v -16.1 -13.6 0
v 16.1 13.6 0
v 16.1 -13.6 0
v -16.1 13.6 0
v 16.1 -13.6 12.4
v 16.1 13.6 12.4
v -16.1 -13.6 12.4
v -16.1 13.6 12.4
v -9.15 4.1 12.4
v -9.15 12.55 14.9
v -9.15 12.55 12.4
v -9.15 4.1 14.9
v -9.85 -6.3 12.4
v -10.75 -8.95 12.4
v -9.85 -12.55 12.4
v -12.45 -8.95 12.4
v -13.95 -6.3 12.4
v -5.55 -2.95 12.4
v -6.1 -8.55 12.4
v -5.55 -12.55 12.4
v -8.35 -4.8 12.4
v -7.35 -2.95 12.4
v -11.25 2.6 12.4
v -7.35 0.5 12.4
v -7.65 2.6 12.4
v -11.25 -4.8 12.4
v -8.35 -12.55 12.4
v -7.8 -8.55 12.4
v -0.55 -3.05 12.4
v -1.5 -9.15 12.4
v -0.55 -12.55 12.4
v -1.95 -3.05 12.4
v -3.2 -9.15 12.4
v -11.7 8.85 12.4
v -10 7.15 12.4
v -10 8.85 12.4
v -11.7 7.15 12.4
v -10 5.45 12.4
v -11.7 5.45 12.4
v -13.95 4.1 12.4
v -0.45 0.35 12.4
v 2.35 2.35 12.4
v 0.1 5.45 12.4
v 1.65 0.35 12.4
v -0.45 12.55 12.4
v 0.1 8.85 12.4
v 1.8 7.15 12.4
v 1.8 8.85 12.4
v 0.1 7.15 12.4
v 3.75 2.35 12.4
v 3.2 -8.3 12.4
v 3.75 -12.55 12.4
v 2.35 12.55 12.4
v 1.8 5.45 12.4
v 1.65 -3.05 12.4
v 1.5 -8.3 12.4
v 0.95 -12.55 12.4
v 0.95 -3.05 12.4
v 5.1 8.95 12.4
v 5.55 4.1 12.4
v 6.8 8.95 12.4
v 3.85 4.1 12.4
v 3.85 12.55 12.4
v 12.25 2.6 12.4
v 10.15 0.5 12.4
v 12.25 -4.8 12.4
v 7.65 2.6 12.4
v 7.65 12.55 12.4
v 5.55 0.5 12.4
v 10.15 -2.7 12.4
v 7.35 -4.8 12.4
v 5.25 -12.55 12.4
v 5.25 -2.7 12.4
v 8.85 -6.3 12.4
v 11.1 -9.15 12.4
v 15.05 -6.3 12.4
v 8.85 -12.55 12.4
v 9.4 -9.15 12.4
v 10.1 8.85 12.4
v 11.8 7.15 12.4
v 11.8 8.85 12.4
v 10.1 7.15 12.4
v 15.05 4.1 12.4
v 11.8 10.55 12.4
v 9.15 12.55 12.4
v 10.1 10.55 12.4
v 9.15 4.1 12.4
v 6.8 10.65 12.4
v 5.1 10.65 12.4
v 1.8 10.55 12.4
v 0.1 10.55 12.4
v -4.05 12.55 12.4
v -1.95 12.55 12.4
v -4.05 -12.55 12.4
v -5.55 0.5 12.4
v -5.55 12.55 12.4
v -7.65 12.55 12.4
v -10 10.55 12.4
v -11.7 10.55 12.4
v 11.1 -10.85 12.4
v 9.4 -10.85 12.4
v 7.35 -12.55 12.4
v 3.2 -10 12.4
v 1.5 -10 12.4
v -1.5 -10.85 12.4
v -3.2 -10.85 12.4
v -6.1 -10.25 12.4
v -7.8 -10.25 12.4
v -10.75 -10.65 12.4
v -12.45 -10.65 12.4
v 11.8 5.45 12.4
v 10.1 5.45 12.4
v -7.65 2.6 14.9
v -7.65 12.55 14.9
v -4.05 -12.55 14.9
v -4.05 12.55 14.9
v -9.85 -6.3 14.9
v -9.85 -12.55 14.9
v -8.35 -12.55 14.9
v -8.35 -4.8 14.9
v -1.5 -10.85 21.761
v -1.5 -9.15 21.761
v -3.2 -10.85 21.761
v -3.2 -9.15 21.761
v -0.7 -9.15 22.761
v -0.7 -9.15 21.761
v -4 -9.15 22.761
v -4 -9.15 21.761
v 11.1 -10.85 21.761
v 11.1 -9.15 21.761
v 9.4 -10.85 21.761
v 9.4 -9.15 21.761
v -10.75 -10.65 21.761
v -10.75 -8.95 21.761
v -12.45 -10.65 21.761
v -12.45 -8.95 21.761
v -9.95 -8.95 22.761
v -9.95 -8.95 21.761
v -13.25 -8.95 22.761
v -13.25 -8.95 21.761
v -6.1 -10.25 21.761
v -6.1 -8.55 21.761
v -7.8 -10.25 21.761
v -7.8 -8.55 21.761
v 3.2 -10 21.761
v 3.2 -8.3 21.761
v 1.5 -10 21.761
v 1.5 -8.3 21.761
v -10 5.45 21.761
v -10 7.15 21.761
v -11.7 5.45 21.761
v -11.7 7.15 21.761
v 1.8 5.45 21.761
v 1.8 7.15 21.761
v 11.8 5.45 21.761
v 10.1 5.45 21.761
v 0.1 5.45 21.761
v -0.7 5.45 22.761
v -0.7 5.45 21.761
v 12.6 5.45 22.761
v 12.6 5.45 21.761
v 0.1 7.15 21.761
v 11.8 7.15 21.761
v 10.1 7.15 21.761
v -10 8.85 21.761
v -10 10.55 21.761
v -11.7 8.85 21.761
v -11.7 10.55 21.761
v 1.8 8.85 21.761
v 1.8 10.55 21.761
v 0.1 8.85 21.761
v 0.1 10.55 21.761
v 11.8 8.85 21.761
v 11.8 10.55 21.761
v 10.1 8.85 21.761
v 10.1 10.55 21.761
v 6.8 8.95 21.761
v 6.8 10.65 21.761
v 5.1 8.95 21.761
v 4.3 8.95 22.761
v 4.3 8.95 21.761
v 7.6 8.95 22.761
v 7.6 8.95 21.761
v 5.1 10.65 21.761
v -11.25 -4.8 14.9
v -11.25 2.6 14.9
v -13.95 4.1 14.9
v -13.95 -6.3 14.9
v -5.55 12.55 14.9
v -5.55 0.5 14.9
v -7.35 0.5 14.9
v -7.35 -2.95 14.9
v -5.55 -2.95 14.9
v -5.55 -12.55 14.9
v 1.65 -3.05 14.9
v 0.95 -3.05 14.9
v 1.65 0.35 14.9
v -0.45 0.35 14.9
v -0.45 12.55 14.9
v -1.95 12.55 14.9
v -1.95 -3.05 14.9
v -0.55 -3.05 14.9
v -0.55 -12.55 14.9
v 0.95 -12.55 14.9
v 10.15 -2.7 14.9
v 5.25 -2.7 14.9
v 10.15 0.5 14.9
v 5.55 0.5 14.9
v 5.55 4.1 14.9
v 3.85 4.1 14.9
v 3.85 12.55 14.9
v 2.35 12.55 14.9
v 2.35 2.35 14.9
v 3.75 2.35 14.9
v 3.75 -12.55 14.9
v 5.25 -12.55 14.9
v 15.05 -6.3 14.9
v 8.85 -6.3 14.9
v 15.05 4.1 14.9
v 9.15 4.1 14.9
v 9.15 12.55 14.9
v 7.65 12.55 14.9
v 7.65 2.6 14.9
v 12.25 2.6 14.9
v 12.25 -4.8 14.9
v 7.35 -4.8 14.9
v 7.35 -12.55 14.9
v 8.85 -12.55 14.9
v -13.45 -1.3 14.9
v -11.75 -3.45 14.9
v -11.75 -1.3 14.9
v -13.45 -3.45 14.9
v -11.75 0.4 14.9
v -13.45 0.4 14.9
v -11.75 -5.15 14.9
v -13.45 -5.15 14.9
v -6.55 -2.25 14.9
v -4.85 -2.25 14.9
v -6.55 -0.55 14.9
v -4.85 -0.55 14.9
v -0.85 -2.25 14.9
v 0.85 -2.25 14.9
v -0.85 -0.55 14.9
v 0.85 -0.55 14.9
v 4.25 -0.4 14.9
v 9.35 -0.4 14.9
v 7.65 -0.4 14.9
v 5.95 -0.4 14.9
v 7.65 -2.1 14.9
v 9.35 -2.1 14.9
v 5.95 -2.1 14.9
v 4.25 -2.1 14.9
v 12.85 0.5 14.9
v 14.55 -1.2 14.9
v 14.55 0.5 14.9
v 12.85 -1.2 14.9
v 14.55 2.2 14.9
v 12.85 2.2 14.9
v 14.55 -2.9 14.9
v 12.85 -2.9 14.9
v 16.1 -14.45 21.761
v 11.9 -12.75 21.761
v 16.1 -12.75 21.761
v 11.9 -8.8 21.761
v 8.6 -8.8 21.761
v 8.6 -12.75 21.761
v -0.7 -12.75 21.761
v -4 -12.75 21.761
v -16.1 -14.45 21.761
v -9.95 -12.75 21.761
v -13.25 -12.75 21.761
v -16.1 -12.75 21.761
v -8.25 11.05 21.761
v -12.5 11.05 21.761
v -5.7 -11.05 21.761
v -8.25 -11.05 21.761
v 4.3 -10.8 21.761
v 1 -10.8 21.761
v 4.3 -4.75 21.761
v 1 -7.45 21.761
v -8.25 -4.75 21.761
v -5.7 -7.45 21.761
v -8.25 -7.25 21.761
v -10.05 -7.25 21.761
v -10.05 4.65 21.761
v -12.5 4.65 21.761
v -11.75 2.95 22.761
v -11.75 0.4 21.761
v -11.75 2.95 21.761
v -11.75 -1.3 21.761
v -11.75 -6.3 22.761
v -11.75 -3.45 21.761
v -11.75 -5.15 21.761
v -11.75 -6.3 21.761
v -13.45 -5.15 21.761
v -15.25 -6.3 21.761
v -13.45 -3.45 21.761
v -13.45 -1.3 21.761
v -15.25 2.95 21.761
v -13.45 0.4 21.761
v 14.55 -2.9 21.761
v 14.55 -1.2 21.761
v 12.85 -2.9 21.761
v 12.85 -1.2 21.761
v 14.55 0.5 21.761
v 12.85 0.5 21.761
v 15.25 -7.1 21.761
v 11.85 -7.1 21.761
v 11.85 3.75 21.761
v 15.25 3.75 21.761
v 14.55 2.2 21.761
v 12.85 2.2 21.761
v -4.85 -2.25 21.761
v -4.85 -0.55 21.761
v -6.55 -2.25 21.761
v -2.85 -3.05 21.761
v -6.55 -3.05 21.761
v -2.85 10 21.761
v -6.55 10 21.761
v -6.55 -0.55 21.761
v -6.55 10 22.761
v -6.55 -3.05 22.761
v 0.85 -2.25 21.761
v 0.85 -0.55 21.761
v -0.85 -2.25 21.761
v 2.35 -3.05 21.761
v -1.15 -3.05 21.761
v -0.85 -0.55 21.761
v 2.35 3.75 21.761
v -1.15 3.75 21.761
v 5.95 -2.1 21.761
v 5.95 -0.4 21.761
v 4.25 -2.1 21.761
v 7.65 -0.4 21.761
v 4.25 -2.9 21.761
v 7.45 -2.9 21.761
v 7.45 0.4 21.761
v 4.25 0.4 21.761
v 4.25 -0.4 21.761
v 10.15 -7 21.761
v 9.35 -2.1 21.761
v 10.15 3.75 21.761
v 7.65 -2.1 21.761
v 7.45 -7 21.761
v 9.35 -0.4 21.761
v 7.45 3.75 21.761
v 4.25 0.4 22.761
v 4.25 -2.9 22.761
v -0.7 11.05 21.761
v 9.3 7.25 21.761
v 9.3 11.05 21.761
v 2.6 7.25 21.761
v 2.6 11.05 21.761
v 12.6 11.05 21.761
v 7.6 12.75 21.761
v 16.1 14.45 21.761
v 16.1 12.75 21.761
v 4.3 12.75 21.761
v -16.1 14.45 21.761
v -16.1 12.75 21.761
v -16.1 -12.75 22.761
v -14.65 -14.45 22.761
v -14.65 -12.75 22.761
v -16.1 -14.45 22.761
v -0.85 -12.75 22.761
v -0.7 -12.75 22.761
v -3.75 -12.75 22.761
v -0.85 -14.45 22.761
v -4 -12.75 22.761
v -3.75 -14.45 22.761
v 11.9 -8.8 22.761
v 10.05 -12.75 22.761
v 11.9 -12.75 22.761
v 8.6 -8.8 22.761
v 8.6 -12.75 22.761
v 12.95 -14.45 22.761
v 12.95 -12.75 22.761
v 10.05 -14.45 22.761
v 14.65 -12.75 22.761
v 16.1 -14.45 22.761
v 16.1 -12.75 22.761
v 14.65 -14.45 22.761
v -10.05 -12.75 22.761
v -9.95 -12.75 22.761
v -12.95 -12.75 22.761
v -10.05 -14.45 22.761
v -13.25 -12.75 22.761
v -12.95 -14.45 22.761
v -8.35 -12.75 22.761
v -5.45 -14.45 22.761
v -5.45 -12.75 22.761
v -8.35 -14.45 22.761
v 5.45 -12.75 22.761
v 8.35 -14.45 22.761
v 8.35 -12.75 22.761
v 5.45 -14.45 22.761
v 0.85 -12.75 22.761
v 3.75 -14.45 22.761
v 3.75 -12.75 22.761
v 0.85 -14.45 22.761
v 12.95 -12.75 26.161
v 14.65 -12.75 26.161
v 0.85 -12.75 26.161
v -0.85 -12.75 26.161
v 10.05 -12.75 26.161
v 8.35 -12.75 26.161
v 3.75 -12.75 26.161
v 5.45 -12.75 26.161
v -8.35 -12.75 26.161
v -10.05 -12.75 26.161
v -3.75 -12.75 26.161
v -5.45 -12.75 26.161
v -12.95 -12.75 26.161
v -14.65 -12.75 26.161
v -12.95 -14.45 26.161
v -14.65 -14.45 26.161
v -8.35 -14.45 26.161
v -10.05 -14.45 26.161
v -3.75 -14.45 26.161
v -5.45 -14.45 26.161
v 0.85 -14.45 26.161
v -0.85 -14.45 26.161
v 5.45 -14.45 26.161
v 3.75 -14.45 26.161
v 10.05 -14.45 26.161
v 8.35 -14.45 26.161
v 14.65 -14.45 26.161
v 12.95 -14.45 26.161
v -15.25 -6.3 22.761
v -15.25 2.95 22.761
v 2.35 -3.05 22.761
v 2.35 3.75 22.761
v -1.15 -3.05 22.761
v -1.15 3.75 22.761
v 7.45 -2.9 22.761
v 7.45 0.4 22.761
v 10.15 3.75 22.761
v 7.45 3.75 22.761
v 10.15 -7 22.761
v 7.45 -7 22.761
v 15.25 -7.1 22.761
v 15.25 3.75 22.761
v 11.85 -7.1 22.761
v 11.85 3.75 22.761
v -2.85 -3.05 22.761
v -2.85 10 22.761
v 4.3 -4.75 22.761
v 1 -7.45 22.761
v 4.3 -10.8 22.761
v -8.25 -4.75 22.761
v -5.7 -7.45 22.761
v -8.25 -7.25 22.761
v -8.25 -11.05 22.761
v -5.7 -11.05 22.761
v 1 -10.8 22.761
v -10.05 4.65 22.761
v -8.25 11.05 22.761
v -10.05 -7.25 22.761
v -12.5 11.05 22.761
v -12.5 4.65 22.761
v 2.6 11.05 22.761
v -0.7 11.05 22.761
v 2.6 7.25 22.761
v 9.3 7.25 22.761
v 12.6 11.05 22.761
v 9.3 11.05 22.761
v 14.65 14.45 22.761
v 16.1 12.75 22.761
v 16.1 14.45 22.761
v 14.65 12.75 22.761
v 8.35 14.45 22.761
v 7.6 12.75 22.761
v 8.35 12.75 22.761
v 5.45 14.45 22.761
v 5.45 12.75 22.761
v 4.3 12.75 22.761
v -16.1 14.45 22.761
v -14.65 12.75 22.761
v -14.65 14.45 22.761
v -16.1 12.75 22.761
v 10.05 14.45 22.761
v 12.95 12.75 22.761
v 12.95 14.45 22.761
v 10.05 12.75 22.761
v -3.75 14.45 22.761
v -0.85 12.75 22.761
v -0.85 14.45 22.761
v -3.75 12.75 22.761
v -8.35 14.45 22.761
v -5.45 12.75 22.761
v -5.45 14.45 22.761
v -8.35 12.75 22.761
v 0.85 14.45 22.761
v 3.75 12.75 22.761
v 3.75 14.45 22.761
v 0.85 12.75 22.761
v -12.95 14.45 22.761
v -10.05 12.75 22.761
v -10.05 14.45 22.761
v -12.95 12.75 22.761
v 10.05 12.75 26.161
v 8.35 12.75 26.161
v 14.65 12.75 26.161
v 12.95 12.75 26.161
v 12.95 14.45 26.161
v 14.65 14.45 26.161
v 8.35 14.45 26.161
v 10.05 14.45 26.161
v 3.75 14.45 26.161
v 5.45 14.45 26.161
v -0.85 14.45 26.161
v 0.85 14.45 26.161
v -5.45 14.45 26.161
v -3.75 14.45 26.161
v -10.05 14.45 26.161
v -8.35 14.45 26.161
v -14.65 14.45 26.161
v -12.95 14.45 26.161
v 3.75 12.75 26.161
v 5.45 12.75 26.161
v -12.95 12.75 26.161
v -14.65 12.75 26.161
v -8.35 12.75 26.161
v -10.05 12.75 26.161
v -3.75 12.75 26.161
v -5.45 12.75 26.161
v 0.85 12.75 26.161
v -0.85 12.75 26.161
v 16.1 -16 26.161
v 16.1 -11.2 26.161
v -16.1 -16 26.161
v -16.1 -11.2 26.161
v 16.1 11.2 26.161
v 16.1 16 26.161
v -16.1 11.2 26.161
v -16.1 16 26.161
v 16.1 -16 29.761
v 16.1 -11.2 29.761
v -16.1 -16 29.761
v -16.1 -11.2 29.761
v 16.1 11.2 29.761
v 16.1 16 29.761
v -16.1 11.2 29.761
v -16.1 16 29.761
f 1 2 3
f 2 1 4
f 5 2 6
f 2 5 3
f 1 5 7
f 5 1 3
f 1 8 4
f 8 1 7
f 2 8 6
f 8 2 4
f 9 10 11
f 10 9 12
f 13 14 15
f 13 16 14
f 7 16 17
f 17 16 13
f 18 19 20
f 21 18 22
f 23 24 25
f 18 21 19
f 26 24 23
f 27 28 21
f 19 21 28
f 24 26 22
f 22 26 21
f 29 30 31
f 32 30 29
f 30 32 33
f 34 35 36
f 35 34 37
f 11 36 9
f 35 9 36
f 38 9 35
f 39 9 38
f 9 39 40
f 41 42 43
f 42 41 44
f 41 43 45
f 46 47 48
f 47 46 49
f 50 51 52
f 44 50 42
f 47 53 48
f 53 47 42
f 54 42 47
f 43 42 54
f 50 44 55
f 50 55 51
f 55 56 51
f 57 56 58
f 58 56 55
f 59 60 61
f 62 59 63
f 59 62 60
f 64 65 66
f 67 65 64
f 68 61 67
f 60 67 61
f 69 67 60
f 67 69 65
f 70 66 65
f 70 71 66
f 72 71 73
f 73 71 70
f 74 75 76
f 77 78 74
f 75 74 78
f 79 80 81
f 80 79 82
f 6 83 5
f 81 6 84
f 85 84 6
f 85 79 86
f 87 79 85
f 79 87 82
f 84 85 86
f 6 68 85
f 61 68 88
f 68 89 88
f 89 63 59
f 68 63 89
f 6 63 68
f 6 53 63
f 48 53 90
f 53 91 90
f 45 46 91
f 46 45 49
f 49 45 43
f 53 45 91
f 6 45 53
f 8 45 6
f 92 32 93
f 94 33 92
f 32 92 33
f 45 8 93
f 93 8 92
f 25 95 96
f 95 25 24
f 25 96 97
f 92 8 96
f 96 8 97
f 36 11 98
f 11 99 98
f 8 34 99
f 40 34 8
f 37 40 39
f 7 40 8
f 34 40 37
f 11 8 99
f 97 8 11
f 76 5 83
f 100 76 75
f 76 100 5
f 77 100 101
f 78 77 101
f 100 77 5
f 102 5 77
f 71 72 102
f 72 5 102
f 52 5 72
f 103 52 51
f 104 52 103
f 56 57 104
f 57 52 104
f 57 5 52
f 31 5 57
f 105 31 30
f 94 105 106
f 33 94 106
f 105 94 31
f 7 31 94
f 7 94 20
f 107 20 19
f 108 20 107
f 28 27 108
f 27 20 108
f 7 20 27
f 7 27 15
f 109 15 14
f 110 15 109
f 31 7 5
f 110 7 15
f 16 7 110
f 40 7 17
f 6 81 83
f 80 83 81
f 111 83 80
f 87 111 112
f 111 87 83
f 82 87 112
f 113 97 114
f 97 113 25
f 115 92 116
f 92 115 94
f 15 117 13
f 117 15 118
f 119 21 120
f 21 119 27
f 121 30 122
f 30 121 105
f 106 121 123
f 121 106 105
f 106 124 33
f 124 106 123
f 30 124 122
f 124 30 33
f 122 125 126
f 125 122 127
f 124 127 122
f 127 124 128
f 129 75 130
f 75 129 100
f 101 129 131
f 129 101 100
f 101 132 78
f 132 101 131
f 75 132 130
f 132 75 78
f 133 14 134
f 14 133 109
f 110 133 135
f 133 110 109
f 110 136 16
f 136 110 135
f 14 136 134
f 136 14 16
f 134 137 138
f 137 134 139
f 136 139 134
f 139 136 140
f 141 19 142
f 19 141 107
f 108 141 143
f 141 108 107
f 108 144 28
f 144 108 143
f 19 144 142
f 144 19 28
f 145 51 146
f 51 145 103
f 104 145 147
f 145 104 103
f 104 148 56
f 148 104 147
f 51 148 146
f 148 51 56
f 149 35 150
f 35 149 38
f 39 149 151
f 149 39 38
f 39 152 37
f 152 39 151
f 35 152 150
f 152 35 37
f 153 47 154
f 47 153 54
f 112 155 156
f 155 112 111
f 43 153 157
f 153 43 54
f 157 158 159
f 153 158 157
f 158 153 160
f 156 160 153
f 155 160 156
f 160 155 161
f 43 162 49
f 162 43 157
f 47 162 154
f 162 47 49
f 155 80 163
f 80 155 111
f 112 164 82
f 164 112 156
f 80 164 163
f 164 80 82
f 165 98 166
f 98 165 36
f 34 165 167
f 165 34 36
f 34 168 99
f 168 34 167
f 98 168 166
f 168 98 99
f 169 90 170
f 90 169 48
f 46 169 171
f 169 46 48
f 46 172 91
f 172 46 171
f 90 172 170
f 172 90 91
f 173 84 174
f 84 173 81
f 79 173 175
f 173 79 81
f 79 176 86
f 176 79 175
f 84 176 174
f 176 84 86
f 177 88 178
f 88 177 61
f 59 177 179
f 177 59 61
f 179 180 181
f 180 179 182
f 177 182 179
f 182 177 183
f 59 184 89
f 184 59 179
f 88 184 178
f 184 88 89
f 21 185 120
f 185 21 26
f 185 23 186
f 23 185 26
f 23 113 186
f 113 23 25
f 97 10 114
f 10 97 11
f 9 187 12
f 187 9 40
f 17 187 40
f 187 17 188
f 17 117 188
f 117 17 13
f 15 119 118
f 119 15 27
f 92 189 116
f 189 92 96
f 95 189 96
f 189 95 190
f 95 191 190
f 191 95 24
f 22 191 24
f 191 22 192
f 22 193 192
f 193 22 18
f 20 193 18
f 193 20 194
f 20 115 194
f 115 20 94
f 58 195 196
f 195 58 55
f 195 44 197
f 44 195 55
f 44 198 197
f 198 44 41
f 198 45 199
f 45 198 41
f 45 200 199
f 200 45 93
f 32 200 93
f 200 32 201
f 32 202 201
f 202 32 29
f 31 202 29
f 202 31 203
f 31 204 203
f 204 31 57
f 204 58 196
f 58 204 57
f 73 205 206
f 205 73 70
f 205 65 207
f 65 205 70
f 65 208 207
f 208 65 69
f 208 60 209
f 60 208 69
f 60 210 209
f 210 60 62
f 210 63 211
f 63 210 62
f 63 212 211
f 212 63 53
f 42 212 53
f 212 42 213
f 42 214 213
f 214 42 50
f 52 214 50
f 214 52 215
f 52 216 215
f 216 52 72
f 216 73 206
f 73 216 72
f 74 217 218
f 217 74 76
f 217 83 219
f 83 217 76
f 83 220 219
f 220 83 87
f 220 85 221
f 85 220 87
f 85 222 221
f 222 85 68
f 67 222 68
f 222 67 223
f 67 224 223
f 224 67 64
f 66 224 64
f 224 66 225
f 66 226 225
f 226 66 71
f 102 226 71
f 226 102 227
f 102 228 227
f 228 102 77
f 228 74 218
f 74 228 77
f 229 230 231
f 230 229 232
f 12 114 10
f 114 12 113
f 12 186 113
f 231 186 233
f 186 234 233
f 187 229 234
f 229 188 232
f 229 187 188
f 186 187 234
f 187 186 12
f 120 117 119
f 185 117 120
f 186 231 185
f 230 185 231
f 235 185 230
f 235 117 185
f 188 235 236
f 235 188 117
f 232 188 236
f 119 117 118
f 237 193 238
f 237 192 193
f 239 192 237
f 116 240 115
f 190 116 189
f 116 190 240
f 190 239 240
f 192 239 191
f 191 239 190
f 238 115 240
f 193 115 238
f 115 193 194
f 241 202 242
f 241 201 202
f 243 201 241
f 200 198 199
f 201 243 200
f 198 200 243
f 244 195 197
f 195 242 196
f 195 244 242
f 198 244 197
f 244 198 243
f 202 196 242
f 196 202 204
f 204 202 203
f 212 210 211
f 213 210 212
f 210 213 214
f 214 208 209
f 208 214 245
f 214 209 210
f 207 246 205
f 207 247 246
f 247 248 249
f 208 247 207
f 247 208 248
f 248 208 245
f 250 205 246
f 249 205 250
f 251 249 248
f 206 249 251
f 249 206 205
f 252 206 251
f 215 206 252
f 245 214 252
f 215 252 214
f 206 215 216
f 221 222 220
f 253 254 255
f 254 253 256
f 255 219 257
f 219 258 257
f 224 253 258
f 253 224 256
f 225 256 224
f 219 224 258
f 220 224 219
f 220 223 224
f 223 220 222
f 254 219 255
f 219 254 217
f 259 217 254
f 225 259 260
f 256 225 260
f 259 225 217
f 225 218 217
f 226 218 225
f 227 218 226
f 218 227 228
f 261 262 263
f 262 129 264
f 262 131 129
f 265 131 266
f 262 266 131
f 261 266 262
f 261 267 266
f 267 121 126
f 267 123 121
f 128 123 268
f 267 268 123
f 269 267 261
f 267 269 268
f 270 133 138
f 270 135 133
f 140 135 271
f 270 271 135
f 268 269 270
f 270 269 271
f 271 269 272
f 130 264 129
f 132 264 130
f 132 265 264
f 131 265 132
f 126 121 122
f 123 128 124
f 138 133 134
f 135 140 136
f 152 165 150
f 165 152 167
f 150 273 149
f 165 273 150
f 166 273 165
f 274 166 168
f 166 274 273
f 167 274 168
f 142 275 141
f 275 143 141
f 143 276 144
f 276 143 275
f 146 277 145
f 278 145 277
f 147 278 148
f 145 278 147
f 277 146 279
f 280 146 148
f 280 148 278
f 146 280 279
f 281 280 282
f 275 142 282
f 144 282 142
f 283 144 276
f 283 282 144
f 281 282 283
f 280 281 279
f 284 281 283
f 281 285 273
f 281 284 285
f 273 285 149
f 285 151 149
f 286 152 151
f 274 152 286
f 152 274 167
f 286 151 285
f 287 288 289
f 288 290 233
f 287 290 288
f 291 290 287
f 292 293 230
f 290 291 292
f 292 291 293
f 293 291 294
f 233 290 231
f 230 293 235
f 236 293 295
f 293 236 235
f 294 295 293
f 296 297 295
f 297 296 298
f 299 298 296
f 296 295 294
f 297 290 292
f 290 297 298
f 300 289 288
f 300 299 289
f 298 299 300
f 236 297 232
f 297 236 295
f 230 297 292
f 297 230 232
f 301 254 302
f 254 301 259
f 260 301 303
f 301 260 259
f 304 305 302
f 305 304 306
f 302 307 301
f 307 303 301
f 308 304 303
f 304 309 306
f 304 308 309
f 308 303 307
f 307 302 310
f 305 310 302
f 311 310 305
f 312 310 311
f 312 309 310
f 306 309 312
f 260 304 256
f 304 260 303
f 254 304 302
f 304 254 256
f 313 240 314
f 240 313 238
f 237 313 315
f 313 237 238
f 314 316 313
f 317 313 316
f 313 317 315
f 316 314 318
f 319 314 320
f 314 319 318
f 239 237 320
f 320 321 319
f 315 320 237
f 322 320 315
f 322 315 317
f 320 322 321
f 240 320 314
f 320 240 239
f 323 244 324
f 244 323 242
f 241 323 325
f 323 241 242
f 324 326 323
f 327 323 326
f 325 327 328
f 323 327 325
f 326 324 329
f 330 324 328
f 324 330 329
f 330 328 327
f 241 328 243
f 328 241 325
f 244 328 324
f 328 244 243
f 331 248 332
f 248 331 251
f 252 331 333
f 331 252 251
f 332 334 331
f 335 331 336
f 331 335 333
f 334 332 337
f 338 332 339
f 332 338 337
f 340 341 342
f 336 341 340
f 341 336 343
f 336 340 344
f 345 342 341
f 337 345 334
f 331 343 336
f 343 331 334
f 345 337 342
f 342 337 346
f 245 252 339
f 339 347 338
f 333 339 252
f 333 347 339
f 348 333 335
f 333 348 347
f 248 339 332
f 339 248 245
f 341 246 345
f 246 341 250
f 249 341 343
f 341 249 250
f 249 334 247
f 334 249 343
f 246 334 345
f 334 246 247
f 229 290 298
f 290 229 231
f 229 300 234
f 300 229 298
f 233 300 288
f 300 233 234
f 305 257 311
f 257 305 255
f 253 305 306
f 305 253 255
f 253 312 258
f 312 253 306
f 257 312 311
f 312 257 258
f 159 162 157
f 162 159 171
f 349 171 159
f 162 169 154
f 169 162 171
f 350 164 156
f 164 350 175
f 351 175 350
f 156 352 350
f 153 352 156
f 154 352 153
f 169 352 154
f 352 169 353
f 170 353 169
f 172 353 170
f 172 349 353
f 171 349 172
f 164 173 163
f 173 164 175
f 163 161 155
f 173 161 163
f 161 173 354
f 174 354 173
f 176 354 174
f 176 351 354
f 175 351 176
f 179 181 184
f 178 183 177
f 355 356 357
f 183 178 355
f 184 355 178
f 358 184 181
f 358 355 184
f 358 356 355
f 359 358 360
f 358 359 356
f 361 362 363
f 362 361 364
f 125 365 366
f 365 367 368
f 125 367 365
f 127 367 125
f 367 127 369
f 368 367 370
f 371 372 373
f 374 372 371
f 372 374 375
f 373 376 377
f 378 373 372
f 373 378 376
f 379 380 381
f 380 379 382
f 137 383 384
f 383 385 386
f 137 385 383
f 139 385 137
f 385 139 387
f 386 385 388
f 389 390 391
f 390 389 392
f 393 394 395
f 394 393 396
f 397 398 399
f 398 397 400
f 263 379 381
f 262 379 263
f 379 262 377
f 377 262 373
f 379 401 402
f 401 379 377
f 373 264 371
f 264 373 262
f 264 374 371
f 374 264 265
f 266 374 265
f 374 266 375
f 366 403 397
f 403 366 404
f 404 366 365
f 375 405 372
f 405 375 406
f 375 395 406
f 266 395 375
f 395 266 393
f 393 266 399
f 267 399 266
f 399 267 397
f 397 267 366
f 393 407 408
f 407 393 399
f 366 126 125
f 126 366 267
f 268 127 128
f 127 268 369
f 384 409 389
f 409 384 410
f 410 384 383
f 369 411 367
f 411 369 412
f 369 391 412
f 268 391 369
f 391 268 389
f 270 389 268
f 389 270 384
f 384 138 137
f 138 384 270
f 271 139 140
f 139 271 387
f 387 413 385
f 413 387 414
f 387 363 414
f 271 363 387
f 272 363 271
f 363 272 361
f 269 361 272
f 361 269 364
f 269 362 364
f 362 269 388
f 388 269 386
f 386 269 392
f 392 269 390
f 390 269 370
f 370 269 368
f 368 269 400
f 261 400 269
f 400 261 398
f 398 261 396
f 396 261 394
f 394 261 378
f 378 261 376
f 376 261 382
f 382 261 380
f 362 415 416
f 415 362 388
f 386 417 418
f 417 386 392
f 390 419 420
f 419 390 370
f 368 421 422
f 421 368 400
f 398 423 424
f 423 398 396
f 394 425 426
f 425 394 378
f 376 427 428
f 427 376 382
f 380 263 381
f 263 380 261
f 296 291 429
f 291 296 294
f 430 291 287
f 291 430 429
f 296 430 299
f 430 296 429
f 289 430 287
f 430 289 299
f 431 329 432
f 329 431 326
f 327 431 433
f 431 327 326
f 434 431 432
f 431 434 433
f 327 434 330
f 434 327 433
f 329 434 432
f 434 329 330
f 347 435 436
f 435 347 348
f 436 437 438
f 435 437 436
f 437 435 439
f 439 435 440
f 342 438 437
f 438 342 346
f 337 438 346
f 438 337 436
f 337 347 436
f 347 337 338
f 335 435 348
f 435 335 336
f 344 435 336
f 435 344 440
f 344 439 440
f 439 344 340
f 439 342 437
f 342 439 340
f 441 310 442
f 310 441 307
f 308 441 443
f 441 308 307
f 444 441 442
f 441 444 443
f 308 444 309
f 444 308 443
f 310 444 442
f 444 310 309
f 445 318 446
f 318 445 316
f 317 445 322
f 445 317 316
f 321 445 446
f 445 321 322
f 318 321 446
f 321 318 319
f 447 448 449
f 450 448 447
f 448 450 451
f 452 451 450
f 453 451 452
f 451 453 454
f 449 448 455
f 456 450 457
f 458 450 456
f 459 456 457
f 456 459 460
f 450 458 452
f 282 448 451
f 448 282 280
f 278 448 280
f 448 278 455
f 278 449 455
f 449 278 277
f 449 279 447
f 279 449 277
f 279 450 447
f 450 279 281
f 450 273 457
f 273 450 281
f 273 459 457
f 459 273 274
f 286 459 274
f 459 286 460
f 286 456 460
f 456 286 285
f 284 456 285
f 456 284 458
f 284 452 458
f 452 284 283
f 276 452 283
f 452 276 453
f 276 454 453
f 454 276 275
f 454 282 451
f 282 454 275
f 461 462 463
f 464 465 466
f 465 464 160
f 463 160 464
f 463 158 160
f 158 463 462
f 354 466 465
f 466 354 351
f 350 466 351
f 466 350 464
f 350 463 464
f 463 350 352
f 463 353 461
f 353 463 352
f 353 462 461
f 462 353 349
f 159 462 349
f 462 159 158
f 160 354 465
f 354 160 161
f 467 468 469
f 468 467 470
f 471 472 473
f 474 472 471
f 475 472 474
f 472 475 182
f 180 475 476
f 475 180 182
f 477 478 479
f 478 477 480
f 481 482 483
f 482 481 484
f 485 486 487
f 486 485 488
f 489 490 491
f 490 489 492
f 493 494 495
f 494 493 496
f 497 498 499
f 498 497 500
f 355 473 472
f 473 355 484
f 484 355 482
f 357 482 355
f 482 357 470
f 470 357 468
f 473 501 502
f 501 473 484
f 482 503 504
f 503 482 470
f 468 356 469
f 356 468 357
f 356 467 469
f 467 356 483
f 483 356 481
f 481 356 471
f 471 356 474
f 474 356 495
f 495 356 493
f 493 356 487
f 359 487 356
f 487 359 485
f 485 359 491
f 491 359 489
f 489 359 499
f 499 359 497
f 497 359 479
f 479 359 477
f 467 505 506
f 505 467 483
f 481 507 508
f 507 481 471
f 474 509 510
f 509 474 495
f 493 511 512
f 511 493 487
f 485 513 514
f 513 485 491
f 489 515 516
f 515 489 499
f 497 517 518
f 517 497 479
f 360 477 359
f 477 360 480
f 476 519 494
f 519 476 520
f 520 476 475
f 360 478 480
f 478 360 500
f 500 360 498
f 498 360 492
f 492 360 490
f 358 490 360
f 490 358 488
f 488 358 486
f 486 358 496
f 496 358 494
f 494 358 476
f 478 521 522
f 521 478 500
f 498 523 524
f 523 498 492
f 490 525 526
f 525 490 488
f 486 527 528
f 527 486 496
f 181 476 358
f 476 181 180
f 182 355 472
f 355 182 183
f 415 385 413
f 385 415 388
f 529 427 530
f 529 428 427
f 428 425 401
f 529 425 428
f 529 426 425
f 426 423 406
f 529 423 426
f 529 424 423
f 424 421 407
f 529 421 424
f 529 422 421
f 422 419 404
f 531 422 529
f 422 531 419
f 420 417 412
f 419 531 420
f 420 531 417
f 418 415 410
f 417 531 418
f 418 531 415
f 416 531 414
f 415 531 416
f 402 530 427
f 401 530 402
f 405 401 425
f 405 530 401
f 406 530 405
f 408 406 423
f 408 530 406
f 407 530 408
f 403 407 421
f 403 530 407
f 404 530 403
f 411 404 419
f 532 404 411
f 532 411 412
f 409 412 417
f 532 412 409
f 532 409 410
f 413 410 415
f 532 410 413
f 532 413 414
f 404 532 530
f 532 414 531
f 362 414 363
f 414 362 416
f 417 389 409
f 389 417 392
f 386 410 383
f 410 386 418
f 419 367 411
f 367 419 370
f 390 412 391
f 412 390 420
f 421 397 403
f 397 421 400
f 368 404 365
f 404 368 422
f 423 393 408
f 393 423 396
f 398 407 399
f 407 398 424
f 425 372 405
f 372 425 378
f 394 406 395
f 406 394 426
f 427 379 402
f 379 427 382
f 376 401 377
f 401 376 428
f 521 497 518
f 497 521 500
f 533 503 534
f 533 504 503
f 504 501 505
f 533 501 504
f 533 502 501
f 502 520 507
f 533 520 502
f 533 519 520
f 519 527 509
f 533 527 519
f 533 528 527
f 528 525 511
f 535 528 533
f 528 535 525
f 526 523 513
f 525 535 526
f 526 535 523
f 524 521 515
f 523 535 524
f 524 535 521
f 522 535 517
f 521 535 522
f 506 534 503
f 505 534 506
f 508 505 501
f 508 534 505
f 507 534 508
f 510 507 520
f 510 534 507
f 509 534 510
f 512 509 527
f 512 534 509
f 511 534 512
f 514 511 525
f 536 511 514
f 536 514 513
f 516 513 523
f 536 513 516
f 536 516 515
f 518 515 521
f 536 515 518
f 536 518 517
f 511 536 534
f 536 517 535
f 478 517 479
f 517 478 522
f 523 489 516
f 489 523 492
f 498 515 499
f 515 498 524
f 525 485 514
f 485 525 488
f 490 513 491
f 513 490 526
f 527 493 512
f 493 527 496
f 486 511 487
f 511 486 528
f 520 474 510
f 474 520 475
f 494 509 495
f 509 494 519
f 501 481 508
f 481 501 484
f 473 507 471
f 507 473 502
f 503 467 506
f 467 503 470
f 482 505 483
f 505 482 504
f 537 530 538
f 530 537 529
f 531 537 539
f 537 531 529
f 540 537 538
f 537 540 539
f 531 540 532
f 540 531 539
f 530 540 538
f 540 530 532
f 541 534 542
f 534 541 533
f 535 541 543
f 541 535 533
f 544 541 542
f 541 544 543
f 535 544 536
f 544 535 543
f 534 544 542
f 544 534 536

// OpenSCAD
// Generated by SolidPython 0.4.2 on 2020-09-29 23:19:35
//!OpenSCAD

scale(v = 0.0100000000) {
	translate(v = [-1610, -1360, 0]) {
		union() {
			color(c = [0.4000000000, 0.4000000000, 0.4000000000]) {
				translate(v = [0, 0, 0]) {
					linear_extrude(height = 1000.0000000000) {
						polygon(paths = [[0, 1, 2, 3]], points = [[0, 0], [0, 2720], [3220, 2720], [3220, 0]]);
					}
				}
			}
			color(c = [0.2000000000, 0.6000000000, 0.2000000000]) {
				translate(v = [0, 0, 1000.0000000000]) {
					linear_extrude(height = 120.0000000000) {
						polygon(paths = [[0, 1, 2, 3]], points = [[0, 1305], [0, 2720], [3220, 2720], [3220, 1305]]);
					}
				}
			}
			color(c = [0.4000000000, 0.4000000000, 0.4000000000]) {
				translate(v = [0, 0, 1000.0000000000]) {
					linear_extrude(height = 120.0000000000) {
						polygon(paths = [[0, 1, 2, 3]], points = [[0, 0], [0, 1305], [3220, 1305], [3220, 0]]);
					}
				}
			}
			color(c = [0.9000000000, 0.6000000000, 0.6000000000]) {
				translate(v = [0, 0, 1120.0000000000]) {
					linear_extrude(height = 120.0000000000) {
						polygon(paths = [[0, 1, 2, 3]], points = [[400, 1845], [400, 2485], [695, 2485], [695, 1845]]);
					}
				}
			}
			color(c = [0.9000000000, 0.6000000000, 0.6000000000]) {
				translate(v = [0, 0, 1120.0000000000]) {
					linear_extrude(height = 120.0000000000) {
						polygon(paths = [[0, 1, 2, 3]], points = [[845, 1845], [845, 2485], [1055, 2485], [1055, 1845]]);
					}
				}
			}
			color(c = [0.9000000000, 0.6000000000, 0.6000000000]) {
				translate(v = [0, 0, 1120.0000000000]) {
					linear_extrude(height = 120.0000000000) {
						polygon(paths = [[0, 1, 2, 3]], points = [[1205, 1845], [1205, 2485], [1415, 2485], [1415, 1845]]);
					}
				}
			}
			color(c = [0.9000000000, 0.6000000000, 0.6000000000]) {
				translate(v = [0, 0, 1120.0000000000]) {
					linear_extrude(height = 120.0000000000) {
						polygon(paths = [[0, 1, 2, 3]], points = [[1565, 1845], [1565, 2485], [1845, 2485], [1845, 1845]]);
					}
				}
			}
			color(c = [0.9000000000, 0.6000000000, 0.6000000000]) {
				translate(v = [0, 0, 1120.0000000000]) {
					linear_extrude(height = 120.0000000000) {
						polygon(paths = [[0, 1, 2, 3]], points = [[1995, 1845], [1995, 2485], [2375, 2485], [2375, 1845]]);
					}
				}
			}
			color(c = [0.9000000000, 0.6000000000, 0.6000000000]) {
				translate(v = [0, 0, 1120.0000000000]) {
					linear_extrude(height = 120.0000000000) {
						polygon(paths = [[0, 1, 2, 3]], points = [[2525, 1845], [2525, 2485], [2830, 2485], [2830, 1845]]);
					}
				}
			}
			color(c = [0.9000000000, 0.6000000000, 0.9000000000]) {
				translate(v = [0, 0, 1120.0000000000]) {
					linear_extrude(height = 120.0000000000) {
						polygon(paths = [[0, 1, 2, 3]], points = [[325, 235], [325, 655], [625, 655], [625, 235]]);
					}
				}
			}
			color(c = [0.9000000000, 0.6000000000, 0.9000000000]) {
				translate(v = [0, 0, 1120.0000000000]) {
					linear_extrude(height = 120.0000000000) {
						polygon(paths = [[0, 1, 2, 3]], points = [[775, 235], [775, 655], [1055, 655], [1055, 235]]);
					}
				}
			}
			color(c = [0.9000000000, 0.6000000000, 0.9000000000]) {
				translate(v = [0, 0, 1120.0000000000]) {
					linear_extrude(height = 120.0000000000) {
						polygon(paths = [[0, 1, 2, 3]], points = [[1205, 235], [1205, 655], [1555, 655], [1555, 235]]);
					}
				}
			}
			color(c = [0.9000000000, 0.6000000000, 0.9000000000]) {
				translate(v = [0, 0, 1120.0000000000]) {
					linear_extrude(height = 120.0000000000) {
						polygon(paths = [[0, 1, 2, 3]], points = [[1705, 235], [1705, 655], [1985, 655], [1985, 235]]);
					}
				}
			}
			color(c = [0.9000000000, 0.6000000000, 0.9000000000]) {
				translate(v = [0, 0, 1120.0000000000]) {
					linear_extrude(height = 120.0000000000) {
						polygon(paths = [[0, 1, 2, 3]], points = [[2135, 235], [2135, 655], [2345, 655], [2345, 235]]);
					}
				}
			}
			color(c = [0.9000000000, 0.6000000000, 0.9000000000]) {
				translate(v = [0, 0, 1120.0000000000]) {
					linear_extrude(height = 120.0000000000) {
						polygon(paths = [[0, 1, 2, 3]], points = [[2495, 235], [2495, 655], [2780, 655], [2780, 235]]);
					}
				}
			}
			color(c = [0.2000000000, 0.6000000000, 0.2000000000]) {
				translate(v = [0, 0, 1120.0000000000]) {
					linear_extrude(height = 120.0000000000) {
						difference() {
							polygon(paths = [[0, 1, 2, 3]], points = [[0, 1305], [0, 2720], [3220, 2720], [3220, 1305]]);
							polygon(paths = [[0, 1, 2, 3]], points = [[400, 1845], [695, 1845], [695, 2485], [400, 2485]]);
							polygon(paths = [[0, 1, 2, 3]], points = [[845, 1845], [1055, 1845], [1055, 2485], [845, 2485]]);
							polygon(paths = [[0, 1, 2, 3]], points = [[1205, 1845], [1415, 1845], [1415, 2485], [1205, 2485]]);
							polygon(paths = [[0, 1, 2, 3]], points = [[1565, 1845], [1845, 1845], [1845, 2485], [1565, 2485]]);
							polygon(paths = [[0, 1, 2, 3]], points = [[1995, 1845], [2375, 1845], [2375, 2485], [1995, 2485]]);
							polygon(paths = [[0, 1, 2, 3]], points = [[2525, 1845], [2830, 1845], [2830, 2485], [2525, 2485]]);
						}
					}
				}
			}
			color(c = [0.4000000000, 0.4000000000, 0.4000000000]) {
				translate(v = [0, 0, 1120.0000000000]) {
					linear_extrude(height = 120.0000000000) {
						difference() {
							polygon(paths = [[0, 1, 2, 3]], points = [[0, 0], [0, 1305], [3220, 1305], [3220, 0]]);
							polygon(paths = [[0, 1, 2, 3]], points = [[325, 235], [625, 235], [625, 655], [325, 655]]);
							polygon(paths = [[0, 1, 2, 3]], points = [[775, 235], [1055, 235], [1055, 655], [775, 655]]);
							polygon(paths = [[0, 1, 2, 3]], points = [[1205, 235], [1555, 235], [1555, 655], [1205, 655]]);
							polygon(paths = [[0, 1, 2, 3]], points = [[1705, 235], [1985, 235], [1985, 655], [1705, 655]]);
							polygon(paths = [[0, 1, 2, 3]], points = [[2135, 235], [2345, 235], [2345, 655], [2135, 655]]);
							polygon(paths = [[0, 1, 2, 3]], points = [[2495, 235], [2780, 235], [2780, 655], [2495, 655]]);
						}
					}
				}
			}
			color(c = [0.1000000000, 0.1000000000, 0.1000000000]) {
				translate(v = [0, 0, 1240.0000000000]) {
					linear_extrude(height = 70.0000000000) {
						polygon(paths = [[0, 1, 2, 3]], points = [[1290, 275], [1290, 445], [1460, 445], [1460, 275]]);
					}
				}
			}
			color(c = [0.1000000000, 0.1000000000, 0.1000000000]) {
				translate(v = [0, 0, 1240.0000000000]) {
					linear_extrude(height = 70.0000000000) {
						polygon(paths = [[0, 1, 2, 3]], points = [[2550, 275], [2550, 445], [2720, 445], [2720, 275]]);
					}
				}
			}
			color(c = [0.1000000000, 0.1000000000, 0.1000000000]) {
				translate(v = [0, 0, 1240.0000000000]) {
					linear_extrude(height = 70.0000000000) {
						polygon(paths = [[0, 1, 2, 3]], points = [[365, 295], [365, 465], [535, 465], [535, 295]]);
					}
				}
			}
			color(c = [0.1000000000, 0.1000000000, 0.1000000000]) {
				translate(v = [0, 0, 1240.0000000000]) {
					linear_extrude(height = 70.0000000000) {
						polygon(paths = [[0, 1, 2, 3]], points = [[830, 335], [830, 505], [1000, 505], [1000, 335]]);
					}
				}
			}
			color(c = [0.1000000000, 0.1000000000, 0.1000000000]) {
				translate(v = [0, 0, 1240.0000000000]) {
					linear_extrude(height = 70.0000000000) {
						polygon(paths = [[0, 1, 2, 3]], points = [[1760, 360], [1760, 530], [1930, 530], [1930, 360]]);
					}
				}
			}
			color(c = [0.1000000000, 0.1000000000, 0.1000000000]) {
				translate(v = [0, 0, 1240.0000000000]) {
					linear_extrude(height = 70.0000000000) {
						polygon(paths = [[0, 1, 2, 3]], points = [[440, 1905], [440, 2075], [610, 2075], [610, 1905]]);
					}
				}
			}
			color(c = [0.1000000000, 0.1000000000, 0.1000000000]) {
				translate(v = [0, 0, 1240.0000000000]) {
					linear_extrude(height = 70.0000000000) {
						polygon(paths = [[0, 1, 2, 3]], points = [[1620, 1905], [1620, 2075], [1790, 2075], [1790, 1905]]);
					}
				}
			}
			color(c = [0.1000000000, 0.1000000000, 0.1000000000]) {
				translate(v = [0, 0, 1240.0000000000]) {
					linear_extrude(height = 70.0000000000) {
						polygon(paths = [[0, 1, 2, 3]], points = [[2620, 1905], [2620, 2075], [2790, 2075], [2790, 1905]]);
					}
				}
			}
			color(c = [0.1000000000, 0.1000000000, 0.1000000000]) {
				translate(v = [0, 0, 1240.0000000000]) {
					linear_extrude(height = 70.0000000000) {
						polygon(paths = [[0, 1, 2, 3]], points = [[440, 2245], [440, 2415], [610, 2415], [610, 2245]]);
					}
				}
			}
			color(c = [0.1000000000, 0.1000000000, 0.1000000000]) {
				translate(v = [0, 0, 1240.0000000000]) {
					linear_extrude(height = 70.0000000000) {
						polygon(paths = [[0, 1, 2, 3]], points = [[1620, 2245], [1620, 2415], [1790, 2415], [1790, 2245]]);
					}
				}
			}
			color(c = [0.1000000000, 0.1000000000, 0.1000000000]) {
				translate(v = [0, 0, 1240.0000000000]) {
					linear_extrude(height = 70.0000000000) {
						polygon(paths = [[0, 1, 2, 3]], points = [[2620, 2245], [2620, 2415], [2790, 2415], [2790, 2245]]);
					}
				}
			}
			color(c = [0.1000000000, 0.1000000000, 0.1000000000]) {
				translate(v = [0, 0, 1240.0000000000]) {
					linear_extrude(height = 70.0000000000) {
						polygon(paths = [[0, 1, 2, 3]], points = [[2120, 2255], [2120, 2425], [2290, 2425], [2290, 2255]]);
					}
				}
			}
			color(c = [1.0000000000, 1.0000000000, 1.0000000000]) {
				translate(v = [0, 0, 1240.0000000000]) {
					linear_extrude(height = 70.0000000000) {
						polygon(paths = [[0, 1, 2, 3, 4, 5, 6, 7, 8, 9, 10, 11]], points = [[625, 105], [625, 730], [215, 730], [215, 1770], [695, 1770], [695, 2615], [845, 2615], [845, 1620], [485, 1620], [485, 880], [775, 880], [775, 105]]);
					}
				}
			}
			color(c = [1.0000000000, 1.0000000000, 1.0000000000]) {
				translate(v = [0, 0, 1240.0000000000]) {
					linear_extrude(height = 70.0000000000) {
						polygon(paths = [[0, 1, 2, 3, 4, 5, 6, 7]], points = [[1055, 105], [1055, 1065], [875, 1065], [875, 1410], [1055, 1410], [1055, 2615], [1205, 2615], [1205, 105]]);
					}
				}
			}
			color(c = [1.0000000000, 1.0000000000, 1.0000000000]) {
				translate(v = [0, 0, 1240.0000000000]) {
					linear_extrude(height = 70.0000000000) {
						polygon(paths = [[0, 1, 2, 3, 4, 5, 6, 7, 8, 9]], points = [[1555, 105], [1555, 1055], [1415, 1055], [1415, 2615], [1565, 2615], [1565, 1395], [1775, 1395], [1775, 1055], [1705, 1055], [1705, 105]]);
					}
				}
			}
			color(c = [1.0000000000, 1.0000000000, 1.0000000000]) {
				translate(v = [0, 0, 1240.0000000000]) {
					linear_extrude(height = 70.0000000000) {
						polygon(paths = [[0, 1, 2, 3, 4, 5, 6, 7, 8, 9, 10, 11]], points = [[1985, 105], [1985, 1595], [1845, 1595], [1845, 2615], [1995, 2615], [1995, 1770], [2165, 1770], [2165, 1410], [2625, 1410], [2625, 1090], [2135, 1090], [2135, 105]]);
					}
				}
			}
			color(c = [1.0000000000, 1.0000000000, 1.0000000000]) {
				translate(v = [0, 0, 1240.0000000000]) {
					linear_extrude(height = 70.0000000000) {
						polygon(paths = [[0, 1, 2, 3, 4, 5, 6, 7, 8, 9, 10, 11]], points = [[2345, 105], [2345, 880], [2835, 880], [2835, 1620], [2375, 1620], [2375, 2615], [2525, 2615], [2525, 1770], [3115, 1770], [3115, 730], [2495, 730], [2495, 105]]);
					}
				}
			}
			color(c = [0.1000000000, 0.1000000000, 0.1000000000]) {
				translate(v = [0, 0, 1310.0000000000]) {
					linear_extrude(height = 180.0000000000) {
						polygon(paths = [[0, 1, 2, 3]], points = [[1290, 275], [1290, 445], [1460, 445], [1460, 275]]);
					}
				}
			}
			color(c = [0.1000000000, 0.1000000000, 0.1000000000]) {
				translate(v = [0, 0, 1310.0000000000]) {
					linear_extrude(height = 180.0000000000) {
						polygon(paths = [[0, 1, 2, 3]], points = [[2550, 275], [2550, 445], [2720, 445], [2720, 275]]);
					}
				}
			}
			color(c = [0.1000000000, 0.1000000000, 0.1000000000]) {
				translate(v = [0, 0, 1310.0000000000]) {
					linear_extrude(height = 180.0000000000) {
						polygon(paths = [[0, 1, 2, 3]], points = [[365, 295], [365, 465], [535, 465], [535, 295]]);
					}
				}
			}
			color(c = [0.1000000000, 0.1000000000, 0.1000000000]) {
				translate(v = [0, 0, 1310.0000000000]) {
					linear_extrude(height = 180.0000000000) {
						polygon(paths = [[0, 1, 2, 3]], points = [[830, 335], [830, 505], [1000, 505], [1000, 335]]);
					}
				}
			}
			color(c = [0.1000000000, 0.1000000000, 0.1000000000]) {
				translate(v = [0, 0, 1310.0000000000]) {
					linear_extrude(height = 180.0000000000) {
						polygon(paths = [[0, 1, 2, 3]], points = [[1760, 360], [1760, 530], [1930, 530], [1930, 360]]);
					}
				}
			}
			color(c = [0.1000000000, 0.1000000000, 0.1000000000]) {
				translate(v = [0, 0, 1310.0000000000]) {
					linear_extrude(height = 180.0000000000) {
						polygon(paths = [[0, 1, 2, 3]], points = [[440, 1905], [440, 2075], [610, 2075], [610, 1905]]);
					}
				}
			}
			color(c = [0.1000000000, 0.1000000000, 0.1000000000]) {
				translate(v = [0, 0, 1310.0000000000]) {
					linear_extrude(height = 180.0000000000) {
						polygon(paths = [[0, 1, 2, 3]], points = [[1620, 1905], [1620, 2075], [1790, 2075], [1790, 1905]]);
					}
				}
			}
			color(c = [0.1000000000, 0.1000000000, 0.1000000000]) {
				translate(v = [0, 0, 1310.0000000000]) {
					linear_extrude(height = 180.0000000000) {
						polygon(paths = [[0, 1, 2, 3]], points = [[2620, 1905], [2620, 2075], [2790, 2075], [2790, 1905]]);
					}
				}
			}
			color(c = [0.1000000000, 0.1000000000, 0.1000000000]) {
				translate(v = [0, 0, 1310.0000000000]) {
					linear_extrude(height = 180.0000000000) {
						polygon(paths = [[0, 1, 2, 3]], points = [[440, 2245], [440, 2415], [610, 2415], [610, 2245]]);
					}
				}
			}
			color(c = [0.1000000000, 0.1000000000, 0.1000000000]) {
				translate(v = [0, 0, 1310.0000000000]) {
					linear_extrude(height = 180.0000000000) {
						polygon(paths = [[0, 1, 2, 3]], points = [[1620, 2245], [1620, 2415], [1790, 2415], [1790, 2245]]);
					}
				}
			}
			color(c = [0.1000000000, 0.1000000000, 0.1000000000]) {
				translate(v = [0, 0, 1310.0000000000]) {
					linear_extrude(height = 180.0000000000) {
						polygon(paths = [[0, 1, 2, 3]], points = [[2620, 2245], [2620, 2415], [2790, 2415], [2790, 2245]]);
					}
				}
			}
			color(c = [0.1000000000, 0.1000000000, 0.1000000000]) {
				translate(v = [0, 0, 1310.0000000000]) {
					linear_extrude(height = 180.0000000000) {
						polygon(paths = [[0, 1, 2, 3]], points = [[2120, 2255], [2120, 2425], [2290, 2425], [2290, 2255]]);
					}
				}
			}
			color(c = [0.7000000000, 0, 0]) {
				translate(v = [0, 0, 1310.0000000000]) {
					linear_extrude(height = 180.0000000000) {
						polygon(paths = [[0, 1, 2, 3, 4, 5, 6, 7, 8, 9, 10, 11]], points = [[625, 105], [625, 730], [215, 730], [215, 1770], [695, 1770], [695, 2615], [845, 2615], [845, 1620], [485, 1620], [485, 880], [775, 880], [775, 105]]);
					}
				}
			}
			color(c = [0.7000000000, 0, 0]) {
				translate(v = [0, 0, 1310.0000000000]) {
					linear_extrude(height = 180.0000000000) {
						polygon(paths = [[0, 1, 2, 3, 4, 5, 6, 7]], points = [[1055, 105], [1055, 1065], [875, 1065], [875, 1410], [1055, 1410], [1055, 2615], [1205, 2615], [1205, 105]]);
					}
				}
			}
			color(c = [0.7000000000, 0, 0]) {
				translate(v = [0, 0, 1310.0000000000]) {
					linear_extrude(height = 180.0000000000) {
						polygon(paths = [[0, 1, 2, 3, 4, 5, 6, 7, 8, 9]], points = [[1555, 105], [1555, 1055], [1415, 1055], [1415, 2615], [1565, 2615], [1565, 1395], [1775, 1395], [1775, 1055], [1705, 1055], [1705, 105]]);
					}
				}
			}
			color(c = [0.7000000000, 0, 0]) {
				translate(v = [0, 0, 1310.0000000000]) {
					linear_extrude(height = 180.0000000000) {
						polygon(paths = [[0, 1, 2, 3, 4, 5, 6, 7, 8, 9, 10, 11]], points = [[1985, 105], [1985, 1595], [1845, 1595], [1845, 2615], [1995, 2615], [1995, 1770], [2165, 1770], [2165, 1410], [2625, 1410], [2625, 1090], [2135, 1090], [2135, 105]]);
					}
				}
			}
			color(c = [0.7000000000, 0, 0]) {
				translate(v = [0, 0, 1310.0000000000]) {
					linear_extrude(height = 180.0000000000) {
						polygon(paths = [[0, 1, 2, 3, 4, 5, 6, 7, 8, 9, 10, 11]], points = [[2345, 105], [2345, 880], [2835, 880], [2835, 1620], [2375, 1620], [2375, 2615], [2525, 2615], [2525, 1770], [3115, 1770], [3115, 730], [2495, 730], [2495, 105]]);
					}
				}
			}
			color(c = [0.1000000000, 0.1000000000, 0.1000000000]) {
				translate(v = [0, 0, 1490.0000000000]) {
					linear_extrude(height = 686.1000000000) {
						polygon(paths = [[0, 1, 2, 3]], points = [[1290, 275], [1290, 445], [1460, 445], [1460, 275]]);
					}
				}
			}
			color(c = [0.1000000000, 0.1000000000, 0.1000000000]) {
				translate(v = [0, 0, 1490.0000000000]) {
					linear_extrude(height = 686.1000000000) {
						polygon(paths = [[0, 1, 2, 3]], points = [[2550, 275], [2550, 445], [2720, 445], [2720, 275]]);
					}
				}
			}
			color(c = [0.1000000000, 0.1000000000, 0.1000000000]) {
				translate(v = [0, 0, 1490.0000000000]) {
					linear_extrude(height = 686.1000000000) {
						polygon(paths = [[0, 1, 2, 3]], points = [[365, 295], [365, 465], [535, 465], [535, 295]]);
					}
				}
			}
			color(c = [0.1000000000, 0.1000000000, 0.1000000000]) {
				translate(v = [0, 0, 1490.0000000000]) {
					linear_extrude(height = 686.1000000000) {
						polygon(paths = [[0, 1, 2, 3]], points = [[830, 335], [830, 505], [1000, 505], [1000, 335]]);
					}
				}
			}
			color(c = [0.1000000000, 0.1000000000, 0.1000000000]) {
				translate(v = [0, 0, 1490.0000000000]) {
					linear_extrude(height = 686.1000000000) {
						polygon(paths = [[0, 1, 2, 3]], points = [[1760, 360], [1760, 530], [1930, 530], [1930, 360]]);
					}
				}
			}
			color(c = [0.1000000000, 0.1000000000, 0.1000000000]) {
				translate(v = [0, 0, 1490.0000000000]) {
					linear_extrude(height = 686.1000000000) {
						polygon(paths = [[0, 1, 2, 3]], points = [[265, 845], [265, 1015], [435, 1015], [435, 845]]);
					}
				}
			}
			color(c = [0.1000000000, 0.1000000000, 0.1000000000]) {
				translate(v = [0, 0, 1490.0000000000]) {
					linear_extrude(height = 686.1000000000) {
						polygon(paths = [[0, 1, 2, 3]], points = [[2895, 1070], [2895, 1240], [3065, 1240], [3065, 1070]]);
					}
				}
			}
			color(c = [0.1000000000, 0.1000000000, 0.1000000000]) {
				translate(v = [0, 0, 1490.0000000000]) {
					linear_extrude(height = 686.1000000000) {
						polygon(paths = [[0, 1, 2, 3]], points = [[955, 1135], [955, 1305], [1125, 1305], [1125, 1135]]);
					}
				}
			}
			color(c = [0.1000000000, 0.1000000000, 0.1000000000]) {
				translate(v = [0, 0, 1490.0000000000]) {
					linear_extrude(height = 686.1000000000) {
						polygon(paths = [[0, 1, 2, 3]], points = [[1525, 1135], [1525, 1305], [1695, 1305], [1695, 1135]]);
					}
				}
			}
			color(c = [0.1000000000, 0.1000000000, 0.1000000000]) {
				translate(v = [0, 0, 1490.0000000000]) {
					linear_extrude(height = 686.1000000000) {
						polygon(paths = [[0, 1, 2, 3]], points = [[2035, 1150], [2035, 1320], [2205, 1320], [2205, 1150]]);
					}
				}
			}
			color(c = [0.1000000000, 0.1000000000, 0.1000000000]) {
				translate(v = [0, 0, 1490.0000000000]) {
					linear_extrude(height = 686.1000000000) {
						polygon(paths = [[0, 1, 2, 3]], points = [[2375, 1150], [2375, 1320], [2545, 1320], [2545, 1150]]);
					}
				}
			}
			color(c = [0.1000000000, 0.1000000000, 0.1000000000]) {
				translate(v = [0, 0, 1490.0000000000]) {
					linear_extrude(height = 686.1000000000) {
						polygon(paths = [[0, 1, 2, 3]], points = [[265, 1230], [265, 1400], [435, 1400], [435, 1230]]);
					}
				}
			}
			color(c = [0.1000000000, 0.1000000000, 0.1000000000]) {
				translate(v = [0, 0, 1490.0000000000]) {
					linear_extrude(height = 686.1000000000) {
						polygon(paths = [[0, 1, 2, 3]], points = [[2895, 1410], [2895, 1580], [3065, 1580], [3065, 1410]]);
					}
				}
			}
			color(c = [0.1000000000, 0.1000000000, 0.1000000000]) {
				translate(v = [0, 0, 1490.0000000000]) {
					linear_extrude(height = 686.1000000000) {
						polygon(paths = [[0, 1, 2, 3]], points = [[440, 1905], [440, 2075], [610, 2075], [610, 1905]]);
					}
				}
			}
			color(c = [0.1000000000, 0.1000000000, 0.1000000000]) {
				translate(v = [0, 0, 1490.0000000000]) {
					linear_extrude(height = 686.1000000000) {
						polygon(paths = [[0, 1, 2, 3]], points = [[1620, 1905], [1620, 2075], [1790, 2075], [1790, 1905]]);
					}
				}
			}
			color(c = [0.1000000000, 0.1000000000, 0.1000000000]) {
				translate(v = [0, 0, 1490.0000000000]) {
					linear_extrude(height = 686.1000000000) {
						polygon(paths = [[0, 1, 2, 3]], points = [[2620, 1905], [2620, 2075], [2790, 2075], [2790, 1905]]);
					}
				}
			}
			color(c = [0.1000000000, 0.1000000000, 0.1000000000]) {
				translate(v = [0, 0, 1490.0000000000]) {
					linear_extrude(height = 686.1000000000) {
						polygon(paths = [[0, 1, 2, 3]], points = [[440, 2245], [440, 2415], [610, 2415], [610, 2245]]);
					}
				}
			}
			color(c = [0.1000000000, 0.1000000000, 0.1000000000]) {
				translate(v = [0, 0, 1490.0000000000]) {
					linear_extrude(height = 686.1000000000) {
						polygon(paths = [[0, 1, 2, 3]], points = [[1620, 2245], [1620, 2415], [1790, 2415], [1790, 2245]]);
					}
				}
			}
			color(c = [0.1000000000, 0.1000000000, 0.1000000000]) {
				translate(v = [0, 0, 1490.0000000000]) {
					linear_extrude(height = 686.1000000000) {
						polygon(paths = [[0, 1, 2, 3]], points = [[2620, 2245], [2620, 2415], [2790, 2415], [2790, 2245]]);
					}
				}
			}
			color(c = [0.1000000000, 0.1000000000, 0.1000000000]) {
				translate(v = [0, 0, 1490.0000000000]) {
					linear_extrude(height = 686.1000000000) {
						polygon(paths = [[0, 1, 2, 3]], points = [[2120, 2255], [2120, 2425], [2290, 2425], [2290, 2255]]);
					}
				}
			}
			color(c = [0.9000000000, 0.6000000000, 0.6000000000]) {
				translate(v = [0, 0, 2176.1000000000]) {
					linear_extrude(height = 100.0000000000) {
						polygon(paths = [[0, 1, 2, 3, 4, 5, 6, 7, 8, 9, 10, 11, 12, 13, 14, 15]], points = [[0, -85], [0, 85], [285, 85], [285, 465], [615, 465], [615, 85], [1210, 85], [1210, 445], [1540, 445], [1540, 85], [2470, 85], [2470, 480], [2800, 480], [2800, 85], [3220, 85], [3220, -85]]);
					}
				}
			}
			color(c = [0.9000000000, 0.6000000000, 0.6000000000]) {
				translate(v = [0, 0, 2176.1000000000]) {
					linear_extrude(height = 100.0000000000) {
						polygon(paths = [[0, 1, 2, 3]], points = [[85, 730], [85, 1655], [435, 1655], [435, 730]]);
					}
				}
			}
			color(c = [0.9000000000, 0.6000000000, 0.6000000000]) {
				translate(v = [0, 0, 2176.1000000000]) {
					linear_extrude(height = 100.0000000000) {
						polygon(paths = [[0, 1, 2, 3]], points = [[1495, 1055], [1495, 1735], [1845, 1735], [1845, 1055]]);
					}
				}
			}
			color(c = [0.9000000000, 0.6000000000, 0.6000000000]) {
				translate(v = [0, 0, 2176.1000000000]) {
					linear_extrude(height = 100.0000000000) {
						polygon(paths = [[0, 1, 2, 3, 4, 5, 6, 7]], points = [[2355, 660], [2355, 1070], [2035, 1070], [2035, 1400], [2355, 1400], [2355, 1735], [2625, 1735], [2625, 660]]);
					}
				}
			}
			color(c = [0.9000000000, 0.6000000000, 0.6000000000]) {
				translate(v = [0, 0, 2176.1000000000]) {
					linear_extrude(height = 100.0000000000) {
						polygon(paths = [[0, 1, 2, 3]], points = [[2795, 650], [2795, 1735], [3135, 1735], [3135, 650]]);
					}
				}
			}
			color(c = [0.9000000000, 0.6000000000, 0.6000000000]) {
				translate(v = [0, 0, 2176.1000000000]) {
					linear_extrude(height = 100.0000000000) {
						polygon(paths = [[0, 1, 2, 3]], points = [[955, 1055], [955, 2360], [1325, 2360], [1325, 1055]]);
					}
				}
			}
			color(c = [0.9000000000, 0.6000000000, 0.6000000000]) {
				translate(v = [0, 0, 2176.1000000000]) {
					linear_extrude(height = 100.0000000000) {
						polygon(paths = [[0, 1, 2, 3, 4, 5, 6, 7, 8, 9, 10, 11, 12, 13]], points = [[785, 255], [785, 635], [605, 635], [605, 1825], [360, 1825], [360, 2465], [785, 2465], [785, 885], [2040, 885], [2040, 280], [1710, 280], [1710, 615], [1040, 615], [1040, 255]]);
					}
				}
			}
			color(c = [0.9000000000, 0.6000000000, 0.6000000000]) {
				translate(v = [0, 0, 2176.1000000000]) {
					linear_extrude(height = 100.0000000000) {
						polygon(paths = [[0, 1, 2, 3, 4, 5, 6, 7]], points = [[1540, 1905], [1540, 2465], [1870, 2465], [1870, 2085], [2540, 2085], [2540, 2465], [2870, 2465], [2870, 1905]]);
					}
				}
			}
			color(c = [0.9000000000, 0.6000000000, 0.6000000000]) {
				translate(v = [0, 0, 2176.1000000000]) {
					linear_extrude(height = 100.0000000000) {
						polygon(paths = [[0, 1, 2, 3, 4, 5, 6, 7]], points = [[2040, 2255], [2040, 2635], [0, 2635], [0, 2805], [3220, 2805], [3220, 2635], [2370, 2635], [2370, 2255]]);
					}
				}
			}
			color(c = [0.5000000000, 0.5000000000, 0.5000000000]) {
				translate(v = [0, 0, 2276.1000000000]) {
					linear_extrude(height = 340.0000000000) {
						polygon(paths = [[0, 1, 2, 3]], points = [[145, -85], [145, 85], [315, 85], [315, -85]]);
					}
				}
			}
			color(c = [0.5000000000, 0.5000000000, 0.5000000000]) {
				translate(v = [0, 0, 2276.1000000000]) {
					linear_extrude(height = 340.0000000000) {
						polygon(paths = [[0, 1, 2, 3]], points = [[605, -85], [605, 85], [775, 85], [775, -85]]);
					}
				}
			}
			color(c = [0.5000000000, 0.5000000000, 0.5000000000]) {
				translate(v = [0, 0, 2276.1000000000]) {
					linear_extrude(height = 340.0000000000) {
						polygon(paths = [[0, 1, 2, 3]], points = [[1065, -85], [1065, 85], [1235, 85], [1235, -85]]);
					}
				}
			}
			color(c = [0.5000000000, 0.5000000000, 0.5000000000]) {
				translate(v = [0, 0, 2276.1000000000]) {
					linear_extrude(height = 340.0000000000) {
						polygon(paths = [[0, 1, 2, 3]], points = [[1525, -85], [1525, 85], [1695, 85], [1695, -85]]);
					}
				}
			}
			color(c = [0.5000000000, 0.5000000000, 0.5000000000]) {
				translate(v = [0, 0, 2276.1000000000]) {
					linear_extrude(height = 340.0000000000) {
						polygon(paths = [[0, 1, 2, 3]], points = [[1985, -85], [1985, 85], [2155, 85], [2155, -85]]);
					}
				}
			}
			color(c = [0.5000000000, 0.5000000000, 0.5000000000]) {
				translate(v = [0, 0, 2276.1000000000]) {
					linear_extrude(height = 340.0000000000) {
						polygon(paths = [[0, 1, 2, 3]], points = [[2445, -85], [2445, 85], [2615, 85], [2615, -85]]);
					}
				}
			}
			color(c = [0.5000000000, 0.5000000000, 0.5000000000]) {
				translate(v = [0, 0, 2276.1000000000]) {
					linear_extrude(height = 340.0000000000) {
						polygon(paths = [[0, 1, 2, 3]], points = [[2905, -85], [2905, 85], [3075, 85], [3075, -85]]);
					}
				}
			}
			color(c = [0.5000000000, 0.5000000000, 0.5000000000]) {
				translate(v = [0, 0, 2276.1000000000]) {
					linear_extrude(height = 340.0000000000) {
						polygon(paths = [[0, 1, 2, 3]], points = [[145, 2635], [145, 2805], [315, 2805], [315, 2635]]);
					}
				}
			}
			color(c = [0.5000000000, 0.5000000000, 0.5000000000]) {
				translate(v = [0, 0, 2276.1000000000]) {
					linear_extrude(height = 340.0000000000) {
						polygon(paths = [[0, 1, 2, 3]], points = [[605, 2635], [605, 2805], [775, 2805], [775, 2635]]);
					}
				}
			}
			color(c = [0.5000000000, 0.5000000000, 0.5000000000]) {
				translate(v = [0, 0, 2276.1000000000]) {
					linear_extrude(height = 340.0000000000) {
						polygon(paths = [[0, 1, 2, 3]], points = [[1065, 2635], [1065, 2805], [1235, 2805], [1235, 2635]]);
					}
				}
			}
			color(c = [0.5000000000, 0.5000000000, 0.5000000000]) {
				translate(v = [0, 0, 2276.1000000000]) {
					linear_extrude(height = 340.0000000000) {
						polygon(paths = [[0, 1, 2, 3]], points = [[1525, 2635], [1525, 2805], [1695, 2805], [1695, 2635]]);
					}
				}
			}
			color(c = [0.5000000000, 0.5000000000, 0.5000000000]) {
				translate(v = [0, 0, 2276.1000000000]) {
					linear_extrude(height = 340.0000000000) {
						polygon(paths = [[0, 1, 2, 3]], points = [[1985, 2635], [1985, 2805], [2155, 2805], [2155, 2635]]);
					}
				}
			}
			color(c = [0.5000000000, 0.5000000000, 0.5000000000]) {
				translate(v = [0, 0, 2276.1000000000]) {
					linear_extrude(height = 340.0000000000) {
						polygon(paths = [[0, 1, 2, 3]], points = [[2445, 2635], [2445, 2805], [2615, 2805], [2615, 2635]]);
					}
				}
			}
			color(c = [0.5000000000, 0.5000000000, 0.5000000000]) {
				translate(v = [0, 0, 2276.1000000000]) {
					linear_extrude(height = 340.0000000000) {
						polygon(paths = [[0, 1, 2, 3]], points = [[2905, 2635], [2905, 2805], [3075, 2805], [3075, 2635]]);
					}
				}
			}
			color(c = [0.3000000000, 0.3000000000, 1]) {
				translate(v = [0, 0, 2616.1000000000]) {
					linear_extrude(height = 360.0000000000) {
						polygon(paths = [[0, 1, 2, 3]], points = [[0, -240], [0, 240], [3220, 240], [3220, -240]]);
					}
				}
			}
			color(c = [0.3000000000, 0.3000000000, 1]) {
				translate(v = [0, 0, 2616.1000000000]) {
					linear_extrude(height = 360.0000000000) {
						polygon(paths = [[0, 1, 2, 3]], points = [[0, 2480], [0, 2960], [3220, 2960], [3220, 2480]]);
					}
				}
			}
		}
	}
}
